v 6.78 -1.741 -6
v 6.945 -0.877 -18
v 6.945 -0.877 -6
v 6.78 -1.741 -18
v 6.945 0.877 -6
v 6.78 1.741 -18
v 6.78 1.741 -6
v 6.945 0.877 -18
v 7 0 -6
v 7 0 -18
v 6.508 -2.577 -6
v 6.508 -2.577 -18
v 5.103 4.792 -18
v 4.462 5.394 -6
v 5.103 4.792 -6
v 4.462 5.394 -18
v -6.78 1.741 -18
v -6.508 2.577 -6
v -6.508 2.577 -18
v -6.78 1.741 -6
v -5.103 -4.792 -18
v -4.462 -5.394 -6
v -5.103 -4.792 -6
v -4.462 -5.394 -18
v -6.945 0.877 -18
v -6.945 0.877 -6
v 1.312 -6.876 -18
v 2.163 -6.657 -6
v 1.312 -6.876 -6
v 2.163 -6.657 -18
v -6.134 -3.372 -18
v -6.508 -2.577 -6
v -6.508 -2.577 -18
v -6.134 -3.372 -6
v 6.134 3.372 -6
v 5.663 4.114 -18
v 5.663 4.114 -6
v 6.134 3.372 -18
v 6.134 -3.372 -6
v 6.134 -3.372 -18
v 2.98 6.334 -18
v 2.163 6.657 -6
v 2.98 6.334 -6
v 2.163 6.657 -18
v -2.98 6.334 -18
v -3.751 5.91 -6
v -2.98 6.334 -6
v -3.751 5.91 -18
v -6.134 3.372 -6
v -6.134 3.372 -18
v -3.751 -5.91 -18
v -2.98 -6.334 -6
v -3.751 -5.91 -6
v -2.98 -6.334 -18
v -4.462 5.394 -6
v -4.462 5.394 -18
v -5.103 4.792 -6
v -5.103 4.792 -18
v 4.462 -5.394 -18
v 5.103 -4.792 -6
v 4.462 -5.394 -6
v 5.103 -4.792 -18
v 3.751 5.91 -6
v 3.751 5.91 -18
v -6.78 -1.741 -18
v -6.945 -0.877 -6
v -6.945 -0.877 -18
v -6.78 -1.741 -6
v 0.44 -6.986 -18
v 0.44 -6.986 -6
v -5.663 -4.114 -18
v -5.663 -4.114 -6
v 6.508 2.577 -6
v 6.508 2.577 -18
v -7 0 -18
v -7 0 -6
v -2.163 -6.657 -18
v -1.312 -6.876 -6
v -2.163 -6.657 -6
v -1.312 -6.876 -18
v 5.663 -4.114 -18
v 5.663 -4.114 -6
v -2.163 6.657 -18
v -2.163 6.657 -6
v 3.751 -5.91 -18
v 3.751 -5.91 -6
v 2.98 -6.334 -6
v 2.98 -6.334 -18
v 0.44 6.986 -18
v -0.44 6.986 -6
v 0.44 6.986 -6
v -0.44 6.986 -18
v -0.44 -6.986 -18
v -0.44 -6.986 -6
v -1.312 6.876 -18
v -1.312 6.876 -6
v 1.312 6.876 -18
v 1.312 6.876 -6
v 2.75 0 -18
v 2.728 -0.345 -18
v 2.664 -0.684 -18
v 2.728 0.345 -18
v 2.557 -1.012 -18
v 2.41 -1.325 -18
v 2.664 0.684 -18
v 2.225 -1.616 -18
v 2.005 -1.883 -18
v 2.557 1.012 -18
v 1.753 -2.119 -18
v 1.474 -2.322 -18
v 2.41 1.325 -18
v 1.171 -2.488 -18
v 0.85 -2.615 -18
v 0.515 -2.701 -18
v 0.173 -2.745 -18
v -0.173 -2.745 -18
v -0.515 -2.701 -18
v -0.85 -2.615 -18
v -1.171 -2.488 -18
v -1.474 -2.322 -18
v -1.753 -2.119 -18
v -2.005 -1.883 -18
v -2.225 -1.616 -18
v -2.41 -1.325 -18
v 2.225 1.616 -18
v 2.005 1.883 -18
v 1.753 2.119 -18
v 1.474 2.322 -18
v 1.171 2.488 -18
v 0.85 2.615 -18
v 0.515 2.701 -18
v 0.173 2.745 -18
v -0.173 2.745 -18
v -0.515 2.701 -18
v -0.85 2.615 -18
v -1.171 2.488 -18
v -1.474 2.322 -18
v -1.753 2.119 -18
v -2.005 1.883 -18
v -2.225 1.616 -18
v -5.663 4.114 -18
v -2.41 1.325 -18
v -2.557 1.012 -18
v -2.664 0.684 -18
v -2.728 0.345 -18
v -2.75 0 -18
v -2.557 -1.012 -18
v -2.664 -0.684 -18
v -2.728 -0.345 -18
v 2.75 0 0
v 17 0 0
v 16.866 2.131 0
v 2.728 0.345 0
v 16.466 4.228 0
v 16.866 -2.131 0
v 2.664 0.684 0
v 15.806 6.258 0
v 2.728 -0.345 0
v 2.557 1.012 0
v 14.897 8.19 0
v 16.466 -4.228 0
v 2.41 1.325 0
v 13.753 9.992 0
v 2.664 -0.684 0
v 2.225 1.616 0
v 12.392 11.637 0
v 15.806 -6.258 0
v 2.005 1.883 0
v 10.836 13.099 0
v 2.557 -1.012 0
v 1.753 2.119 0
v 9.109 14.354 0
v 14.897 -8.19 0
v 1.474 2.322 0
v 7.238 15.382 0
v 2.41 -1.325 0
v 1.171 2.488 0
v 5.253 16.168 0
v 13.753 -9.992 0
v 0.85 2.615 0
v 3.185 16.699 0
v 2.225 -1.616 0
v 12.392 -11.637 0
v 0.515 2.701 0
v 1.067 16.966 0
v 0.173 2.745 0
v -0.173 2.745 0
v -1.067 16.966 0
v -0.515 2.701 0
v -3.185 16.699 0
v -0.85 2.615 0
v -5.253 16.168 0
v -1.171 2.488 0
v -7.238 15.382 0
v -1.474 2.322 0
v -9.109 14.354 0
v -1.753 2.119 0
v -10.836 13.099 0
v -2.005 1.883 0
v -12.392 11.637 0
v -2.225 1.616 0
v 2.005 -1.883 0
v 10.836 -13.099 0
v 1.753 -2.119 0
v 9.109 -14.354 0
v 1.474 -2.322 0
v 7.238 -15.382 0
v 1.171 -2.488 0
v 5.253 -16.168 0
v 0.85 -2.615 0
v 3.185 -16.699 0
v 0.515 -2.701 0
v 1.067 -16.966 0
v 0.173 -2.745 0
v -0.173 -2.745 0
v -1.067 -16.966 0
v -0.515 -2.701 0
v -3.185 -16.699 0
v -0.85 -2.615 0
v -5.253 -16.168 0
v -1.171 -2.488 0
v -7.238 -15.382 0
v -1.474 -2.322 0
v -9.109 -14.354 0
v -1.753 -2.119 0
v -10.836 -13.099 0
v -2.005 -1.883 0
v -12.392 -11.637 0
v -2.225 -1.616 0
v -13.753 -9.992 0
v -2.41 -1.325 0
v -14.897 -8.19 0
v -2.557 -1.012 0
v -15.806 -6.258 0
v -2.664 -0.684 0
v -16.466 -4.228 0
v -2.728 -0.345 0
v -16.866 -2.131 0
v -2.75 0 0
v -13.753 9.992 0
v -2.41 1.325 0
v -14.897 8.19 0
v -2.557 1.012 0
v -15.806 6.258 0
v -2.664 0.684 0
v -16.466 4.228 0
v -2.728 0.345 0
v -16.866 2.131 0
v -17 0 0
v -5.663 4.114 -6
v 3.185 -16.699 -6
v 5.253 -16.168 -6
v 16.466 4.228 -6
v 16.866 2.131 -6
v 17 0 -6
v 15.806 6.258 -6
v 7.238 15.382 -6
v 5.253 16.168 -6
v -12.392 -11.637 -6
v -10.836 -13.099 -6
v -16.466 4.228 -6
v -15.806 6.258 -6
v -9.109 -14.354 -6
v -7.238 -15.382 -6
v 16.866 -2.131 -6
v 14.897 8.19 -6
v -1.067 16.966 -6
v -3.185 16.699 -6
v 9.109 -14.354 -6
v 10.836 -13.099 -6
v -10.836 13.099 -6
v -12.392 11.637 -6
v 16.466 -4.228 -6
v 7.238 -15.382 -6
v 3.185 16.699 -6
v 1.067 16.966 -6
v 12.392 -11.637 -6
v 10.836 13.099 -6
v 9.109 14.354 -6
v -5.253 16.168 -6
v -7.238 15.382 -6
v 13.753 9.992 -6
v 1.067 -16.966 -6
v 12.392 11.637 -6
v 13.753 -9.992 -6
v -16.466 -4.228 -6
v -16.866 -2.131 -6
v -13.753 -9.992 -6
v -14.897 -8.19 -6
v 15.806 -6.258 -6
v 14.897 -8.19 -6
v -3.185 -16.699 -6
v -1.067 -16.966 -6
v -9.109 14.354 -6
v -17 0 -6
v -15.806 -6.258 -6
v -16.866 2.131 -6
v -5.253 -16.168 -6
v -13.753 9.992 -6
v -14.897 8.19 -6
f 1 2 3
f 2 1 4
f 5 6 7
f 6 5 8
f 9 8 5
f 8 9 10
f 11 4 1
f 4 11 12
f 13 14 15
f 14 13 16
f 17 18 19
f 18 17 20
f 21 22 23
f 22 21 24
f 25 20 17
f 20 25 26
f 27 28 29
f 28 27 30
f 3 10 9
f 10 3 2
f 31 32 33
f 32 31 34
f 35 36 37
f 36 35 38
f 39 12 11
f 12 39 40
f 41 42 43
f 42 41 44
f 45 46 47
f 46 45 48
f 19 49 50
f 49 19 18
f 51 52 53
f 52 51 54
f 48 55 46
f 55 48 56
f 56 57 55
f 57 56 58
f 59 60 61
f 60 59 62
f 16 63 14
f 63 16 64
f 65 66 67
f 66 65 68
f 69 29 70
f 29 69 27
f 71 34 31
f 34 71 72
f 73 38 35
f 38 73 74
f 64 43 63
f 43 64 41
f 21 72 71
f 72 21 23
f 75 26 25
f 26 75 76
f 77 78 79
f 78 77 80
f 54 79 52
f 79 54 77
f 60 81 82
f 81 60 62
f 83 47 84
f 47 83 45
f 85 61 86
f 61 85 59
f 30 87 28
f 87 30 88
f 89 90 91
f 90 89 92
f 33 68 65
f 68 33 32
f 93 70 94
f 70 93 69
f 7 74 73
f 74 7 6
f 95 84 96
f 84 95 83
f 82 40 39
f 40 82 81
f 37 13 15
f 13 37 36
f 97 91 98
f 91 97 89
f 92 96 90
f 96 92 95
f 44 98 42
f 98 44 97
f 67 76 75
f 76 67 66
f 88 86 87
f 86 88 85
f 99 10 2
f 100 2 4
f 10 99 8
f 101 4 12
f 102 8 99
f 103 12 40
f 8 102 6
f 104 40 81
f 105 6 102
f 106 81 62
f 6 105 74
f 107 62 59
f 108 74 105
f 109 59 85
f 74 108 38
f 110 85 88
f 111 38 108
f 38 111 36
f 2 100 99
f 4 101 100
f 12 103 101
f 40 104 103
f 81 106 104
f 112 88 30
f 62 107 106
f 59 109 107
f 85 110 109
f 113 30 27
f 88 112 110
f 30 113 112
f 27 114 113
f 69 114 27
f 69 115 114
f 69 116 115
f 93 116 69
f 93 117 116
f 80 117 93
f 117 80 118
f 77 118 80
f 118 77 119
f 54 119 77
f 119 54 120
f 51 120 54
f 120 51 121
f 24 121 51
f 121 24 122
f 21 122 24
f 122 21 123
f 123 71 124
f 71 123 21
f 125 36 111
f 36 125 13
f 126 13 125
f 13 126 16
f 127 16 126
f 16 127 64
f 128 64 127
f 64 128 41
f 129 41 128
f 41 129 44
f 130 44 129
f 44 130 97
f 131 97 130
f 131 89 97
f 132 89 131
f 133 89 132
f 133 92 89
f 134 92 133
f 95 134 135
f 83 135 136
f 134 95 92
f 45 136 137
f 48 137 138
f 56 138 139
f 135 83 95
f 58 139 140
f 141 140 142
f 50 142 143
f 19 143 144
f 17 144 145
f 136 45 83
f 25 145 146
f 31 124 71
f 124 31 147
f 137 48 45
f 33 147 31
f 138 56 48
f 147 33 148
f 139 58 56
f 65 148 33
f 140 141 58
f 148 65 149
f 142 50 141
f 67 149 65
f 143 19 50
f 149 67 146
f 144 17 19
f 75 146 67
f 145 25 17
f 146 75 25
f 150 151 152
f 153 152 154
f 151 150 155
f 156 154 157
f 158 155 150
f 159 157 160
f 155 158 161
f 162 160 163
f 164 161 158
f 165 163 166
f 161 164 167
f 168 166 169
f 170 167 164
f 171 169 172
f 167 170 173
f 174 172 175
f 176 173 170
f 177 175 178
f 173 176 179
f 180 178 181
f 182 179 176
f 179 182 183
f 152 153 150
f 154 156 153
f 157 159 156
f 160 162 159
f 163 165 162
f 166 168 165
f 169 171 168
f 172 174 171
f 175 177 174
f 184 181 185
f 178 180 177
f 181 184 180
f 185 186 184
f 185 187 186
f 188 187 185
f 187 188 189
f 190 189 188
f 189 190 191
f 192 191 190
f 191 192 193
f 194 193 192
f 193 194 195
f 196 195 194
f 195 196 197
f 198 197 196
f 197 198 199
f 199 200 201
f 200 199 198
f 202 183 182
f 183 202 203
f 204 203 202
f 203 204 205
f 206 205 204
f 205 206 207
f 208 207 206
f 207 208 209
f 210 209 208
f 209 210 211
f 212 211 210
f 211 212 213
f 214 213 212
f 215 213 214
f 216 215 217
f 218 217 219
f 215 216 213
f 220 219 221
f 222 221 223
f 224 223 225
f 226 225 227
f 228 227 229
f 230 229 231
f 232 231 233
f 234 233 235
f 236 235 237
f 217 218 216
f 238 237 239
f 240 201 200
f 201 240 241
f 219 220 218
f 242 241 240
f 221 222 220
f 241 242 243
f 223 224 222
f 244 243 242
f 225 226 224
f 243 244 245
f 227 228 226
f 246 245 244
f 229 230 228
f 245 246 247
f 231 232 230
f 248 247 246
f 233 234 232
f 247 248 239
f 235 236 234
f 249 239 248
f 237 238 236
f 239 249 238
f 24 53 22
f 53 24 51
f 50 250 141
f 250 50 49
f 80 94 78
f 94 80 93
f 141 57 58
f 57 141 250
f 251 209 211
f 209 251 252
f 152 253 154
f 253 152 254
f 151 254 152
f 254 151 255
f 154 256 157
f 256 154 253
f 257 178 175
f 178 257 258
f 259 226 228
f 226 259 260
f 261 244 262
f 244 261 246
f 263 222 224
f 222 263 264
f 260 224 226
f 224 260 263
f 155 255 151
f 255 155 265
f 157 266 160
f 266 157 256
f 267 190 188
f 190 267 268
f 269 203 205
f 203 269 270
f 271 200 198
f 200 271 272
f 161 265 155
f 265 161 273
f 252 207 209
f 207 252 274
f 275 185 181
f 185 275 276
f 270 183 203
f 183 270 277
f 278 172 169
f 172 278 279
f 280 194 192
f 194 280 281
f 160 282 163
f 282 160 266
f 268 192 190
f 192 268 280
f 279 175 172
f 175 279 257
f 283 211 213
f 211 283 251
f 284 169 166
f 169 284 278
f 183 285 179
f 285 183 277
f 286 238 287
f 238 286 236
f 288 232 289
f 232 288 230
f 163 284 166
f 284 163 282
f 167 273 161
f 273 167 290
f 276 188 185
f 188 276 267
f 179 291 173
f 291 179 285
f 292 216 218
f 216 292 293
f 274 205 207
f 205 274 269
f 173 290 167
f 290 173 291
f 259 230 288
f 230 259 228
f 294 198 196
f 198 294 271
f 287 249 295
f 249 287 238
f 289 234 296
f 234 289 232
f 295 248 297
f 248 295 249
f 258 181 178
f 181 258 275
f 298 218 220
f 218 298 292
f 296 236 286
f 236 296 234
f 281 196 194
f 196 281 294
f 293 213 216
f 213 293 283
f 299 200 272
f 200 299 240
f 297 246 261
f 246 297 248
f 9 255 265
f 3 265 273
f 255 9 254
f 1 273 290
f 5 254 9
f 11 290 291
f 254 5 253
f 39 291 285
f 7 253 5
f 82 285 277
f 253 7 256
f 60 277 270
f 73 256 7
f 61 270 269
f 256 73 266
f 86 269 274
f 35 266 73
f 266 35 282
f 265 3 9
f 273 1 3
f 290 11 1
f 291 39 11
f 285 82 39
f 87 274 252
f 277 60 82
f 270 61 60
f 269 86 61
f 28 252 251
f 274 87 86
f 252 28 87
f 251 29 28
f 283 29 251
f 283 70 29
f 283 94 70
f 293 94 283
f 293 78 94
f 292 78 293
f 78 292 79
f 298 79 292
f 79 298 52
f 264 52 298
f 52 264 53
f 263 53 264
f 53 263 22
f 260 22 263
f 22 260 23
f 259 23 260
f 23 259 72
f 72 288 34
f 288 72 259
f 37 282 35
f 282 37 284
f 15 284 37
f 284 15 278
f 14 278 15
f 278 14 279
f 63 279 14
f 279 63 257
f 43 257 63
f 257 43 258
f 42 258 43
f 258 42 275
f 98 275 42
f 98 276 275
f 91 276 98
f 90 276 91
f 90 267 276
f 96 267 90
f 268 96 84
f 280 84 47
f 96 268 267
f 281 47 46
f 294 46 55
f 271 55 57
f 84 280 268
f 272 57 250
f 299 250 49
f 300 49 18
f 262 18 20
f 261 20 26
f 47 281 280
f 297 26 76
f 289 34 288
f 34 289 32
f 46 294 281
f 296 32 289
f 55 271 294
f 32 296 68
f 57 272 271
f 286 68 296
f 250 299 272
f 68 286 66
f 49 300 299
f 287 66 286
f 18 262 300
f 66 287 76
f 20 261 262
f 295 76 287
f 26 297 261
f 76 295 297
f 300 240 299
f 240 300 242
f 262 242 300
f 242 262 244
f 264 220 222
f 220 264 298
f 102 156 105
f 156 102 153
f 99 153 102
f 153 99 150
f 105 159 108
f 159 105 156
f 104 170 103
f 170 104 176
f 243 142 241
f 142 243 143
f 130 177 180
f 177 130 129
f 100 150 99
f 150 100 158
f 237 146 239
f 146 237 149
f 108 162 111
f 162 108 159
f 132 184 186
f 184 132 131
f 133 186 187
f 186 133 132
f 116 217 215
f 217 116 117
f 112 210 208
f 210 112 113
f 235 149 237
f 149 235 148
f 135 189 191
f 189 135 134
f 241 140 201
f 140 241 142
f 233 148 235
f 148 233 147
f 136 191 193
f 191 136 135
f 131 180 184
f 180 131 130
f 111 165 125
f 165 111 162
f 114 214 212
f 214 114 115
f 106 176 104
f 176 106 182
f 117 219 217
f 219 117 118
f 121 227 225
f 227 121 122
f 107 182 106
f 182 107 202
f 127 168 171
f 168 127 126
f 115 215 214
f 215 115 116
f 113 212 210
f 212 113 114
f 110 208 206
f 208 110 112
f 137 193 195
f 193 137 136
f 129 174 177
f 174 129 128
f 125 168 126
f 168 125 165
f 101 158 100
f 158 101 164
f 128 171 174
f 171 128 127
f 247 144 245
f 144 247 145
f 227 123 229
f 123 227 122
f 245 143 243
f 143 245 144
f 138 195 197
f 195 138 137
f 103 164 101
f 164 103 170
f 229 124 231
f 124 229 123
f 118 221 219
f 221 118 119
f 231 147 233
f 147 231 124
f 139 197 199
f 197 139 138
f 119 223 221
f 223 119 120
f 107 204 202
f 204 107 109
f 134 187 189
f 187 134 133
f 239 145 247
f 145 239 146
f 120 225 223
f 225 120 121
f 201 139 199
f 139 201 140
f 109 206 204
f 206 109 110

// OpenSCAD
$fn = 50;


difference() {
	union() {
		translate(v = [0, 0, -18.0000000000]) {
			cylinder(h = 18, r = 7.0000000000);
		}
		translate(v = [0, 0, -6.0000000000]) {
			cylinder(h = 6, r = 17.0000000000);
		}
	}
	union() {
		#translate(v = [0, 0, -18]) {
			cylinder(h = 18, r = 2.7500000000);
		}
	}
}
